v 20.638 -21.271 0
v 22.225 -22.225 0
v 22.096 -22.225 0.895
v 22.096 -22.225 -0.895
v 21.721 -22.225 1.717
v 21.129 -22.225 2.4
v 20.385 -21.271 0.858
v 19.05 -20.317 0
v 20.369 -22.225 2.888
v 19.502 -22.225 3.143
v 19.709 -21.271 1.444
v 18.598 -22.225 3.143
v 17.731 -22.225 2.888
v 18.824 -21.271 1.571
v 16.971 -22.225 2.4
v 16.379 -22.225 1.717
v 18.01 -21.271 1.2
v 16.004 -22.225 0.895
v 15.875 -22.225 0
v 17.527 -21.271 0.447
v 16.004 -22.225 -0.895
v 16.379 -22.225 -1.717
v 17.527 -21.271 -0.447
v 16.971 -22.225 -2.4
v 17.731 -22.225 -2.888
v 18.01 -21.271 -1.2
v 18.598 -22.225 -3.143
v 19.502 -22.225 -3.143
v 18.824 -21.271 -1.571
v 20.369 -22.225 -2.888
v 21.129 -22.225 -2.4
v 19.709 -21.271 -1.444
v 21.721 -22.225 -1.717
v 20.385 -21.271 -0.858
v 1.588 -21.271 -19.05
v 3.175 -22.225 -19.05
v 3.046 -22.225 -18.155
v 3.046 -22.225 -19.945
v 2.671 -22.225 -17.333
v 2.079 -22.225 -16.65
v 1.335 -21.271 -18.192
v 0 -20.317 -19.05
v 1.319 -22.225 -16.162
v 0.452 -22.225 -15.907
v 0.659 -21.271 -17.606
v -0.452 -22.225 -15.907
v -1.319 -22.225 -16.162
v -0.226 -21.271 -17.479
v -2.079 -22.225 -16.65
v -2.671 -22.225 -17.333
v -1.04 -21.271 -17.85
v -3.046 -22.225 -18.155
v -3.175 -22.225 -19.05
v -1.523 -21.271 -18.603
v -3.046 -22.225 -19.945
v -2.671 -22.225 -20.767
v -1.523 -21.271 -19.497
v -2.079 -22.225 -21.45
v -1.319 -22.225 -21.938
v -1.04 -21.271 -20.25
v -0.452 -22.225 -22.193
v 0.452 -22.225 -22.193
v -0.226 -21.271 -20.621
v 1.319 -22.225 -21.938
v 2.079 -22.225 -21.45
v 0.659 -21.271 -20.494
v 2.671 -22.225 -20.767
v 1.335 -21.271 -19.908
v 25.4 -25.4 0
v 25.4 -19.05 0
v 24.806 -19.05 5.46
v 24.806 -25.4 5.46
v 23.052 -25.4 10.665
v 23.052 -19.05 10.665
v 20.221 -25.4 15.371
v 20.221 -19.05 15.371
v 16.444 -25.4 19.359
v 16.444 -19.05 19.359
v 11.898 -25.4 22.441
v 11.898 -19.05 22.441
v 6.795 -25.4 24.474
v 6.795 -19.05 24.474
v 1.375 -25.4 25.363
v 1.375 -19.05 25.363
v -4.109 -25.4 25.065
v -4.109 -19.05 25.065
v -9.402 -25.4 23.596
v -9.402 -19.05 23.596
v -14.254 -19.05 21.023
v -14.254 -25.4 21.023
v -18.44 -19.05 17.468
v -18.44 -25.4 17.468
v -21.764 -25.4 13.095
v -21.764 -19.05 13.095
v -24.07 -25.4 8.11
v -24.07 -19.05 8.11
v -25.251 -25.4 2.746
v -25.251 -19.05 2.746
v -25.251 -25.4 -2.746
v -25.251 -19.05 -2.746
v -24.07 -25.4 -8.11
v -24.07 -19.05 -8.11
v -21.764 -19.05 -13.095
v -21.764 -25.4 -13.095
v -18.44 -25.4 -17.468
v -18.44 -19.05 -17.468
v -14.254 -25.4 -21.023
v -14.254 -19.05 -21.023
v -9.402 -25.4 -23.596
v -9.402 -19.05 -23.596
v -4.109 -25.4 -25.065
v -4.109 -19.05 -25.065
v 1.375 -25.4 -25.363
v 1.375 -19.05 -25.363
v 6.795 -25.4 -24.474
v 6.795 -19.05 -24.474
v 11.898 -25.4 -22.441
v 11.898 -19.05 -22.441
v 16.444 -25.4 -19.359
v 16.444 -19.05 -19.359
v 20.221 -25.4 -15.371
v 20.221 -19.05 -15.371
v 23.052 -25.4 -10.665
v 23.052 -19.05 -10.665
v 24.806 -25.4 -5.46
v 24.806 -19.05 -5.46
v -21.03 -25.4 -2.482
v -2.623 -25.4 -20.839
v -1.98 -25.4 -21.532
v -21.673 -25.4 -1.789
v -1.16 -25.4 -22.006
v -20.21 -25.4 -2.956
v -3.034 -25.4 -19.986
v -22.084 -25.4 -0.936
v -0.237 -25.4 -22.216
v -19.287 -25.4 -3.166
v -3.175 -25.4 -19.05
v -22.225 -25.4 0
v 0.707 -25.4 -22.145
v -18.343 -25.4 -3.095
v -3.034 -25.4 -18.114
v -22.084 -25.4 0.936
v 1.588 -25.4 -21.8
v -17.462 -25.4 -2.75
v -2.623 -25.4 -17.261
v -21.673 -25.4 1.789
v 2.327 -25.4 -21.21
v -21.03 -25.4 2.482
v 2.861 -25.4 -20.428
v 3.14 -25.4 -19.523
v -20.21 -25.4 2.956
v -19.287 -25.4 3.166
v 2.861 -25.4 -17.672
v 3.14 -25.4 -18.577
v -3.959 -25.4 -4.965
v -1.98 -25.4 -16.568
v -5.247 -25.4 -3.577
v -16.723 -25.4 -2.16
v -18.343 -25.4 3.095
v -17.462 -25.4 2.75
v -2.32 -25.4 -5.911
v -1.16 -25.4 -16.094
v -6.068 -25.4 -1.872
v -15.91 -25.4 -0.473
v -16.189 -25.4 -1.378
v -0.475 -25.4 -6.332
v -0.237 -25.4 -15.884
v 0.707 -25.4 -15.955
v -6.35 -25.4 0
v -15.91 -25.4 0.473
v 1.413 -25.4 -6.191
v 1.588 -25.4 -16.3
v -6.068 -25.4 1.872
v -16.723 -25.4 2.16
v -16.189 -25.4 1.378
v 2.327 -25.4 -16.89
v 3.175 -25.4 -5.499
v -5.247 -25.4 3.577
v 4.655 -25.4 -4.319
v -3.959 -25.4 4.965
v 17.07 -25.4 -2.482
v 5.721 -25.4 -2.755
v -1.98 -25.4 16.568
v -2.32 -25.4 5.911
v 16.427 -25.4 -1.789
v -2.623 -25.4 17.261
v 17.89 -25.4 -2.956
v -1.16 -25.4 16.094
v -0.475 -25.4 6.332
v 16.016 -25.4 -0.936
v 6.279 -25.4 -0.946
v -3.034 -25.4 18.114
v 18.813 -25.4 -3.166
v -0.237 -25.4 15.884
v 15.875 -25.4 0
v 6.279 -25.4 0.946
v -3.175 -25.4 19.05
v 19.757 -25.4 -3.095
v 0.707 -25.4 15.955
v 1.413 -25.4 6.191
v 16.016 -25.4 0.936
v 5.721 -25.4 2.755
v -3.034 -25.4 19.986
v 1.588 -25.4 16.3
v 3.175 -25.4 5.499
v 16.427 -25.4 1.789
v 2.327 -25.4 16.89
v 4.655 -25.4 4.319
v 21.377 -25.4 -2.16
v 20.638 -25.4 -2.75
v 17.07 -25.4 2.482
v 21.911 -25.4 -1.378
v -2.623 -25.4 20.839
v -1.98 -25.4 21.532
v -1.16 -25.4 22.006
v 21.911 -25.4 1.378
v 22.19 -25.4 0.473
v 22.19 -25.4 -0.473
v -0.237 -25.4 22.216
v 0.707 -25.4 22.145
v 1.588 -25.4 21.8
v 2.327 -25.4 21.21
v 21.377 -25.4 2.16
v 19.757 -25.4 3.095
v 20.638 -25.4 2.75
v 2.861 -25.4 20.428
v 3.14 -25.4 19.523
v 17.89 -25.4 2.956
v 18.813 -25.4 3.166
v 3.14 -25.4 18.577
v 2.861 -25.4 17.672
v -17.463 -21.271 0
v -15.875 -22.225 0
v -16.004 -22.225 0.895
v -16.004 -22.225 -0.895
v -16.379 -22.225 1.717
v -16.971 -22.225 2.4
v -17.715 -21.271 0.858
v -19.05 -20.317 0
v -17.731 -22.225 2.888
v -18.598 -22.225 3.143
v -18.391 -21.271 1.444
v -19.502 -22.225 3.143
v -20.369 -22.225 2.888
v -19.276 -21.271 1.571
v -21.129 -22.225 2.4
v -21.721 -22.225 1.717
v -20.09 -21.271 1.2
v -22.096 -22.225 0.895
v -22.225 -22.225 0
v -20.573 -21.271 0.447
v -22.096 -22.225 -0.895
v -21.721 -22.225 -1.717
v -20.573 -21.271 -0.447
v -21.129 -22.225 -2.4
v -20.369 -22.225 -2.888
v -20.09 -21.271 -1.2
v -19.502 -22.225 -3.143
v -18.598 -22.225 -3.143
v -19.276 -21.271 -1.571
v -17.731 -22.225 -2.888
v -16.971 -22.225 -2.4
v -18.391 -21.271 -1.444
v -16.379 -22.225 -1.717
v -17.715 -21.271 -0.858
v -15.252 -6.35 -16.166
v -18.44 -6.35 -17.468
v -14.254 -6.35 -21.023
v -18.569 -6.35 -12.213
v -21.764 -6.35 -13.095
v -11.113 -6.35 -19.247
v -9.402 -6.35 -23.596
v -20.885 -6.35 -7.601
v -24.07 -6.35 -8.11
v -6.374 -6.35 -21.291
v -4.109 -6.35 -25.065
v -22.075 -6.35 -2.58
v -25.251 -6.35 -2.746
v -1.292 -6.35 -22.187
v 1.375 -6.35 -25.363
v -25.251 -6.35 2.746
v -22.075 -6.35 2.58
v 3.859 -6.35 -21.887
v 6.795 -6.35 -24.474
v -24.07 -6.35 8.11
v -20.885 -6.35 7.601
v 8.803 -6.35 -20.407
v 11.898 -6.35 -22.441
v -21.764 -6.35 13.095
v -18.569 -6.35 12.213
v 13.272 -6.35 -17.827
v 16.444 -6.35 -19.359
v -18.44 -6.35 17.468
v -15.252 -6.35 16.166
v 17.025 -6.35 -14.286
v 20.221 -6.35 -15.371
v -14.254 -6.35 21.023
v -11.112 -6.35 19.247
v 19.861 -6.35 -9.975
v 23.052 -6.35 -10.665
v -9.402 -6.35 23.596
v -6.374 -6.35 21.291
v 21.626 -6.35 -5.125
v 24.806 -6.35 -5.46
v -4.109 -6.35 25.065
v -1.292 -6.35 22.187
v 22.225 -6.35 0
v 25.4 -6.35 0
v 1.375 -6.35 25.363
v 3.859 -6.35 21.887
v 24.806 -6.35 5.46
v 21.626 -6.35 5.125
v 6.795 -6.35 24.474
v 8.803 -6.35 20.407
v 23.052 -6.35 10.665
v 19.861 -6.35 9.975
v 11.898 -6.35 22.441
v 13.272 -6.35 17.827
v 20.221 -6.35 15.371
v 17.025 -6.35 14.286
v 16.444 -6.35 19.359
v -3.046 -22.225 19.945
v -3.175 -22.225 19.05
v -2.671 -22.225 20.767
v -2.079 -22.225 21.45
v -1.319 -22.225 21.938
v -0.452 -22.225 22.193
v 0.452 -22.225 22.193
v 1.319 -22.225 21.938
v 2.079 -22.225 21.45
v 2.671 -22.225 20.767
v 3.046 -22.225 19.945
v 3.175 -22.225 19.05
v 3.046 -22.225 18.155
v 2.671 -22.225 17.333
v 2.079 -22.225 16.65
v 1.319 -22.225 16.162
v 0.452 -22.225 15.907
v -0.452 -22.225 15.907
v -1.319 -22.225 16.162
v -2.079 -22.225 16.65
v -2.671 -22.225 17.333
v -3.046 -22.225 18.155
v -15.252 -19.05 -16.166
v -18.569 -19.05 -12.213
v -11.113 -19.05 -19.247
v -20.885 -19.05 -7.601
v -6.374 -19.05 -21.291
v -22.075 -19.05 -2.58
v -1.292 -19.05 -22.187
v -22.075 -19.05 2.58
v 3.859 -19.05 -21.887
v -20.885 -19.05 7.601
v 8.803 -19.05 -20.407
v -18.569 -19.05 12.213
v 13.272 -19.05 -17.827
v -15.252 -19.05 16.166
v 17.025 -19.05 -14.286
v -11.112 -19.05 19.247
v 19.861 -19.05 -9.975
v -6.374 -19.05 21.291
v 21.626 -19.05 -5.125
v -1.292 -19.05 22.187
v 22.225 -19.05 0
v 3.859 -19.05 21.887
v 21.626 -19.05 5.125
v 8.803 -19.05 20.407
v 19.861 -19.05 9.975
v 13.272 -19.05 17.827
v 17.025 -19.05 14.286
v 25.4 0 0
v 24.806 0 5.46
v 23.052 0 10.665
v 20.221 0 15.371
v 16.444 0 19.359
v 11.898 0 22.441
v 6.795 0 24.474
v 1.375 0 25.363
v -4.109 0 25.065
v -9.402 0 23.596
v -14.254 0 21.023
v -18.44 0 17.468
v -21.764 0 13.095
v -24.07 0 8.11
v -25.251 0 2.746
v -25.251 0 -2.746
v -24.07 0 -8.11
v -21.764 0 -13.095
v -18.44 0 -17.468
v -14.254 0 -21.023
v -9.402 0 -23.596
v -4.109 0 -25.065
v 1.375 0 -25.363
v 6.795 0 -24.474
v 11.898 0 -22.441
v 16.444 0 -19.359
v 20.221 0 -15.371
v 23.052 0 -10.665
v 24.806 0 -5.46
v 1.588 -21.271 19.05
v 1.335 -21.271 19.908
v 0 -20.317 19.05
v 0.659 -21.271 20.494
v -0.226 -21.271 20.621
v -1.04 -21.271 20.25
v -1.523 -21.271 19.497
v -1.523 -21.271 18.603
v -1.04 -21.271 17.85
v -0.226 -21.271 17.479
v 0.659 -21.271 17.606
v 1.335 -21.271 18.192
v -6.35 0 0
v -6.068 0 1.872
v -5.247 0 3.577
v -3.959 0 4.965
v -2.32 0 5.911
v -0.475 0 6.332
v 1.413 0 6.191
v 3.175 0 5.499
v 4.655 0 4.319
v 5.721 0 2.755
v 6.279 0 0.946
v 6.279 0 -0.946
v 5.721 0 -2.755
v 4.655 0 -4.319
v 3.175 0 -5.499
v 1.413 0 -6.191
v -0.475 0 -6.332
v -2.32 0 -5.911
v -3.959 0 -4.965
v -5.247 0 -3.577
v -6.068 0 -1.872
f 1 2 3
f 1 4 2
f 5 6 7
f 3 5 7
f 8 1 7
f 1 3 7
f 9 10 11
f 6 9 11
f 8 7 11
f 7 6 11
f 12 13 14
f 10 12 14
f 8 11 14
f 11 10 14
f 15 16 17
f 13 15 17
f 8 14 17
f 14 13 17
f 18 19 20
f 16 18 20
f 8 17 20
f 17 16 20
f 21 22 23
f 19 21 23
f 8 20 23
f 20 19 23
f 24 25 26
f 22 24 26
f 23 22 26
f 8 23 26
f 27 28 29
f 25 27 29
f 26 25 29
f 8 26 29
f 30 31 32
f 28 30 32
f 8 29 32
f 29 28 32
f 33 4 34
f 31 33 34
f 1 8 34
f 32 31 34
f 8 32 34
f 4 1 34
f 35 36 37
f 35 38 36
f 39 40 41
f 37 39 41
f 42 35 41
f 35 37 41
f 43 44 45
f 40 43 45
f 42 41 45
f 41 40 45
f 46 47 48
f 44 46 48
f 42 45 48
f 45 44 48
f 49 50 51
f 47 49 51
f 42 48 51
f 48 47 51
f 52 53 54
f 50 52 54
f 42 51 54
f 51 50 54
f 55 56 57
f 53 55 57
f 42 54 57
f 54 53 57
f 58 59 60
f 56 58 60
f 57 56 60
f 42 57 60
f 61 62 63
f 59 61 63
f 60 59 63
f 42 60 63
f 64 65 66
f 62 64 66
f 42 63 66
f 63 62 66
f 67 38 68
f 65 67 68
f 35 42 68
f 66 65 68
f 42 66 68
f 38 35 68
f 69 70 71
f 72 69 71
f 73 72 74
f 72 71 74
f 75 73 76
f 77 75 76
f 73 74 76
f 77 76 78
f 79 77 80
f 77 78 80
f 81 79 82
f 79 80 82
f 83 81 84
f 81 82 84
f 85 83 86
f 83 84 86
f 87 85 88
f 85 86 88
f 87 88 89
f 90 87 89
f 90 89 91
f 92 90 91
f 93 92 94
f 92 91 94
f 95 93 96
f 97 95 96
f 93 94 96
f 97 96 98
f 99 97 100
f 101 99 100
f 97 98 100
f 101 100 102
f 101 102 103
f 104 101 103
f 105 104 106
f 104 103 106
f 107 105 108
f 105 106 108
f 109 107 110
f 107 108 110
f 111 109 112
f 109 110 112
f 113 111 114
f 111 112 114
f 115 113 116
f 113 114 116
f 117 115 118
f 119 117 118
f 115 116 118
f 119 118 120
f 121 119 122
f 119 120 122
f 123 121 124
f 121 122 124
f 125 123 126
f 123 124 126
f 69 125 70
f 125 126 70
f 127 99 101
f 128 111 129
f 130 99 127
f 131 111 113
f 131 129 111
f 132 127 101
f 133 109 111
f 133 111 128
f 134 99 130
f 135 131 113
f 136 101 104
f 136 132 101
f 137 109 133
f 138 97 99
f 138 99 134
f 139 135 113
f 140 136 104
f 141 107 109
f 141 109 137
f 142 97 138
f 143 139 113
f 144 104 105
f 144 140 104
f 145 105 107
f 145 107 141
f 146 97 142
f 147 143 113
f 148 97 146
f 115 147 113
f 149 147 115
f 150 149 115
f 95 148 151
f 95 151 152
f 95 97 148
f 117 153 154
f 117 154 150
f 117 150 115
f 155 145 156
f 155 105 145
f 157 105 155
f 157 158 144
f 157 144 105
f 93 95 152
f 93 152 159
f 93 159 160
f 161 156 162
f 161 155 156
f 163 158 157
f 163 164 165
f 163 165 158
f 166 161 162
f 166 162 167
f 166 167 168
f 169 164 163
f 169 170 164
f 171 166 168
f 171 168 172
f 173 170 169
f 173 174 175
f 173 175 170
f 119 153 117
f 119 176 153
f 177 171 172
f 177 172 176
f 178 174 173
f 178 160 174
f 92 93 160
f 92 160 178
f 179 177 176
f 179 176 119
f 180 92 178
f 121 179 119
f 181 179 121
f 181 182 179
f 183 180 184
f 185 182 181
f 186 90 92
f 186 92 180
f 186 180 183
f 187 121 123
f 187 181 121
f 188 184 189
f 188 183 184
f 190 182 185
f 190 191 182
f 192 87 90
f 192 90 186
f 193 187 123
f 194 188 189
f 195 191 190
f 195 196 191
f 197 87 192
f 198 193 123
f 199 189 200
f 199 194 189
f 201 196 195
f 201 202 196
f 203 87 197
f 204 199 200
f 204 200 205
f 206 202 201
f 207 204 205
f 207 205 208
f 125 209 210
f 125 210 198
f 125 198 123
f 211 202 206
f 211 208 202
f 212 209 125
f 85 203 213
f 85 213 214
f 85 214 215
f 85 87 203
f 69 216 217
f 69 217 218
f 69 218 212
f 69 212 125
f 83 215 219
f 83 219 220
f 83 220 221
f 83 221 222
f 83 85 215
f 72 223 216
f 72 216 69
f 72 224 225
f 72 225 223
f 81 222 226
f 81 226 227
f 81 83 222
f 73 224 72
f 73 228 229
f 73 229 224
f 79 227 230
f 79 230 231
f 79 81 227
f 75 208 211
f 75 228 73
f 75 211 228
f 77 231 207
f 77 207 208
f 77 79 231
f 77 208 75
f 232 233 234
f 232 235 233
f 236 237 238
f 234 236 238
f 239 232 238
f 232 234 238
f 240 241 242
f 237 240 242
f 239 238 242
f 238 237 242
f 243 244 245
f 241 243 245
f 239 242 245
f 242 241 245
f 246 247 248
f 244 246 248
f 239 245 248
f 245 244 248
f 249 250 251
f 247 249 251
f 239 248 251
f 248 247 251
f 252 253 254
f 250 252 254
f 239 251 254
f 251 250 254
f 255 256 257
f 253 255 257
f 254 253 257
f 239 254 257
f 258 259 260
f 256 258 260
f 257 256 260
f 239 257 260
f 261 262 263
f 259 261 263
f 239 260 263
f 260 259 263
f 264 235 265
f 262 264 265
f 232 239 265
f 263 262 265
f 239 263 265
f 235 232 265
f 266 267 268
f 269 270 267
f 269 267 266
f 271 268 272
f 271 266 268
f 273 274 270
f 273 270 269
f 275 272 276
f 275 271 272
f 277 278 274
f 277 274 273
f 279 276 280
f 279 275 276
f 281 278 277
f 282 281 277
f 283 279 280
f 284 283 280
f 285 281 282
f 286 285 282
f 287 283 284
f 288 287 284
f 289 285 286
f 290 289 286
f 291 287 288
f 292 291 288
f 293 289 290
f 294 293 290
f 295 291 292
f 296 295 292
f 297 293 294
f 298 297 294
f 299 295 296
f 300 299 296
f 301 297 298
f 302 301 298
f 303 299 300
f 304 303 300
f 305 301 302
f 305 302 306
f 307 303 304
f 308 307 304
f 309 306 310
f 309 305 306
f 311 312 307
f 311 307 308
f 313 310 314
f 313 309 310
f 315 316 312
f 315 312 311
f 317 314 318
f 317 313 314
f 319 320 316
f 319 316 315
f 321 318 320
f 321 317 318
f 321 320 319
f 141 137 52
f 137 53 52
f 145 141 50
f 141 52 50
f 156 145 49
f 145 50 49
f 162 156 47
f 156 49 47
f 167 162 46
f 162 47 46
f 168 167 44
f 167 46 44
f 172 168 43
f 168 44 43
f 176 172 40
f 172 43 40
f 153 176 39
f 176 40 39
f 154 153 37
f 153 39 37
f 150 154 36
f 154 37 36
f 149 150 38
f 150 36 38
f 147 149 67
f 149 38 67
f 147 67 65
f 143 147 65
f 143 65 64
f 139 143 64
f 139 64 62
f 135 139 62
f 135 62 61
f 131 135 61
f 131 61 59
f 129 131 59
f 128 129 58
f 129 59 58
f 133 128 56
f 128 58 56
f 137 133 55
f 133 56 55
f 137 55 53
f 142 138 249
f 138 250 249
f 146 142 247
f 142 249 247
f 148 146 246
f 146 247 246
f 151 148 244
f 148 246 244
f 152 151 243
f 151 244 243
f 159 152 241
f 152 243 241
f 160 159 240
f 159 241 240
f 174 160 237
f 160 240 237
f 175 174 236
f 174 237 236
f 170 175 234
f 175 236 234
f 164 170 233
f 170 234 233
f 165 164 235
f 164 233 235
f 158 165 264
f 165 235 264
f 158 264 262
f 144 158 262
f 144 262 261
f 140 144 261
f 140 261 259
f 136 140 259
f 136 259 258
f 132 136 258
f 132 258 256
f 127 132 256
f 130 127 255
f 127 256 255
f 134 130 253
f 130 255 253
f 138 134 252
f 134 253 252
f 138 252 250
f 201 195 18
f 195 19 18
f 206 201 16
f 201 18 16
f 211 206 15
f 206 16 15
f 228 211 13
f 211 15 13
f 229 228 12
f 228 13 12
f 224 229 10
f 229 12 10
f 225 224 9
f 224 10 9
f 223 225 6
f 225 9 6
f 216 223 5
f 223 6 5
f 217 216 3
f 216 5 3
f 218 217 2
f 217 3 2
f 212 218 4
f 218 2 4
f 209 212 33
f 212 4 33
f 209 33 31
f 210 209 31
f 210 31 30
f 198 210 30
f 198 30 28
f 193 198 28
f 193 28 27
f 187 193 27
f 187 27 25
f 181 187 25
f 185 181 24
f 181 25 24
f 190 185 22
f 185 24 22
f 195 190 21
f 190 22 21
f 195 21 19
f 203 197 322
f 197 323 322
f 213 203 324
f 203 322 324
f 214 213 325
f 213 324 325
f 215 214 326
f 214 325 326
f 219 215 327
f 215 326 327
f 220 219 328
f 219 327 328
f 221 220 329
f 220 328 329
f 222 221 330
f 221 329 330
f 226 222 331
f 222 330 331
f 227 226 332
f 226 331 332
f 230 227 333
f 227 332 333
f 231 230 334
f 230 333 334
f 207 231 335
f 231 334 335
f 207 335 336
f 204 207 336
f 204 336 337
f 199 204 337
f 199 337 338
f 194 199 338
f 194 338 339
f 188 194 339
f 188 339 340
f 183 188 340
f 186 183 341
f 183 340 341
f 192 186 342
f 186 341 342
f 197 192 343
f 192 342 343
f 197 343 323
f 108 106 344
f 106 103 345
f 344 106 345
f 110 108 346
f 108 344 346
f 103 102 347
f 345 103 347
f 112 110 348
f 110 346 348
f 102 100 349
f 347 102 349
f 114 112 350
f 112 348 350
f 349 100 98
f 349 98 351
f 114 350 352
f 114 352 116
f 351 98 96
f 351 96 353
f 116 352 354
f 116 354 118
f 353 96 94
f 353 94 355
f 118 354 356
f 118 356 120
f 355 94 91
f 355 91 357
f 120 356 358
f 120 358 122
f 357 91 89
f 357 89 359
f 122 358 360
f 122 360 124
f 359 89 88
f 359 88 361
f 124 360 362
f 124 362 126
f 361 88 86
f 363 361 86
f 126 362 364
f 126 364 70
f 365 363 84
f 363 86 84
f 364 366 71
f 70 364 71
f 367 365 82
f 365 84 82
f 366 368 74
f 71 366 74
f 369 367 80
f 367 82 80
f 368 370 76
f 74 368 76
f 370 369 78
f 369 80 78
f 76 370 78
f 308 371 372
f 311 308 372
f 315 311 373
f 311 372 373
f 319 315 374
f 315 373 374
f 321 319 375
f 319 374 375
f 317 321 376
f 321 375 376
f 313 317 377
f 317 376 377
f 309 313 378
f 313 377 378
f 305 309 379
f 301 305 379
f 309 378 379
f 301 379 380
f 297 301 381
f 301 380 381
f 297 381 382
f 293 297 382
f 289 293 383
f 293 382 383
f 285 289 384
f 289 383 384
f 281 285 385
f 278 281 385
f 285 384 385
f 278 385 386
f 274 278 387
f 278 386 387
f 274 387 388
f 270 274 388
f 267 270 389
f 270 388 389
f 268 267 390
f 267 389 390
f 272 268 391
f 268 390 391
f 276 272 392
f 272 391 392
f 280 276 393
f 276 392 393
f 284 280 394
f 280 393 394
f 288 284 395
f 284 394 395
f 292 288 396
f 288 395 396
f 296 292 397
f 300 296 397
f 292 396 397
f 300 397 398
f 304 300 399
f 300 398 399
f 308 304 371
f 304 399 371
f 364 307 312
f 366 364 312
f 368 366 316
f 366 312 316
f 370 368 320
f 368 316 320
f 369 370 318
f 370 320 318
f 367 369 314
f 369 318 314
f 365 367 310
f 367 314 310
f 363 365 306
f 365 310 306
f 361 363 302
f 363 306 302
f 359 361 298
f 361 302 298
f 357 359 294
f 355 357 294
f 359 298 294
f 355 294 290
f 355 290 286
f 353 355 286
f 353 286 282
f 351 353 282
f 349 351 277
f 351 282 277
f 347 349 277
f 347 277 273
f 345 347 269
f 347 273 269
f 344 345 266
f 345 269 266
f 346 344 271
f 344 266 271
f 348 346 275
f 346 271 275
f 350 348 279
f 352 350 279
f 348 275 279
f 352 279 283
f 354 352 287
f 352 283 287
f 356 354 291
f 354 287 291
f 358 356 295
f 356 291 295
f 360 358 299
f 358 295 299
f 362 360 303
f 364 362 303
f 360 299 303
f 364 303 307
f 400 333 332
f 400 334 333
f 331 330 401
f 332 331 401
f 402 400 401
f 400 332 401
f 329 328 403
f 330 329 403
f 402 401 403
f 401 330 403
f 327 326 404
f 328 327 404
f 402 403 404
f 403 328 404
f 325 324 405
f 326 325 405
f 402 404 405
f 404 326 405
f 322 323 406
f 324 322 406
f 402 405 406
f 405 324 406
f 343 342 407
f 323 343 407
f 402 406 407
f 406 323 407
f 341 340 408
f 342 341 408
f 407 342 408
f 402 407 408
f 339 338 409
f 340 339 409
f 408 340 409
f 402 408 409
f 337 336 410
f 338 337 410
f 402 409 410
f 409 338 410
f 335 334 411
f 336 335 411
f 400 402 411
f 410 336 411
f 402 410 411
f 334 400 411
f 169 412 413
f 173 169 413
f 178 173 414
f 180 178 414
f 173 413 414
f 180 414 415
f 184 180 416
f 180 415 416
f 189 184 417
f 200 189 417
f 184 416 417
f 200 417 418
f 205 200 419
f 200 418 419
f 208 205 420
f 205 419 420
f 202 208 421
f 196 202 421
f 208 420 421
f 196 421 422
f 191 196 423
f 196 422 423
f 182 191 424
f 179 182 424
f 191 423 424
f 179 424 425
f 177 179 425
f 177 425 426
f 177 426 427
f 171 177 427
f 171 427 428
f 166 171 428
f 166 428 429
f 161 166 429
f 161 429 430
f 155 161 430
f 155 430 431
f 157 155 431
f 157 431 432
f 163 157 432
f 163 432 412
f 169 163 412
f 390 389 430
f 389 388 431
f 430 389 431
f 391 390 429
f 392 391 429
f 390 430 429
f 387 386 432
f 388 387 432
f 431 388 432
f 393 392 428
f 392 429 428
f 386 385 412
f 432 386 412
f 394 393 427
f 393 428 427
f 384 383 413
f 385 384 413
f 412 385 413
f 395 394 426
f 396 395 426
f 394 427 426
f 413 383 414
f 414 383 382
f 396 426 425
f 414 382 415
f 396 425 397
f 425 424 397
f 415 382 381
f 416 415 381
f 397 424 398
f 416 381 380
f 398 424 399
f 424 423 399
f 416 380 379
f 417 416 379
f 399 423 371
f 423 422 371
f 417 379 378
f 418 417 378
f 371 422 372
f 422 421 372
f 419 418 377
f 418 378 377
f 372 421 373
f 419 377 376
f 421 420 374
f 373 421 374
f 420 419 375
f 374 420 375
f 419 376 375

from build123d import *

# Parameters (mm, degrees)
F0_R     = 25.4
F1_DEPTH = 6.35
F2_R     = 22.225
F3_DEPTH = 12.7
F4_R     = 25.4
F5_DEPTH = 6.35
F7_D     = 6.35
F7_DEPTH = 3.175
F7_TIP   = 1.9077324654
F9_D     = 12.7


with BuildPart() as f1:
    # F0 (on Front) → F1 (new body)
    with BuildSketch(Plane.XZ):
        Circle(F0_R)
    extrude(amount=F1_DEPTH)

    # F2 (on face) → F3 (join)
    with BuildSketch(Plane.XZ.offset(6.35)):
        Circle(F2_R)
    extrude(amount=F3_DEPTH)

    # F4 (on face) → F5 (join)
    with BuildSketch(Plane.XZ.offset(19.05)):
        Circle(F4_R)
    extrude(amount=F5_DEPTH)

    # F7
    with Locations(Plane.XZ.offset(25.4)):
        with Locations((-19.05, 0), (0, -19.05), (19.05, 0), (0, 19.05)):
            Hole(F7_D / 2, depth=F7_DEPTH)
            with Locations((0, 0, -(F7_DEPTH + F7_TIP / 2))):  # 118° drill point
                Cone(0, F7_D / 2, F7_TIP, mode=Mode.SUBTRACT)

    # F9 (through all)
    with Locations(Plane.XZ.offset(25.4)):
        with Locations((0, 0)):
            Hole(F9_D / 2)


solid = f1.part
